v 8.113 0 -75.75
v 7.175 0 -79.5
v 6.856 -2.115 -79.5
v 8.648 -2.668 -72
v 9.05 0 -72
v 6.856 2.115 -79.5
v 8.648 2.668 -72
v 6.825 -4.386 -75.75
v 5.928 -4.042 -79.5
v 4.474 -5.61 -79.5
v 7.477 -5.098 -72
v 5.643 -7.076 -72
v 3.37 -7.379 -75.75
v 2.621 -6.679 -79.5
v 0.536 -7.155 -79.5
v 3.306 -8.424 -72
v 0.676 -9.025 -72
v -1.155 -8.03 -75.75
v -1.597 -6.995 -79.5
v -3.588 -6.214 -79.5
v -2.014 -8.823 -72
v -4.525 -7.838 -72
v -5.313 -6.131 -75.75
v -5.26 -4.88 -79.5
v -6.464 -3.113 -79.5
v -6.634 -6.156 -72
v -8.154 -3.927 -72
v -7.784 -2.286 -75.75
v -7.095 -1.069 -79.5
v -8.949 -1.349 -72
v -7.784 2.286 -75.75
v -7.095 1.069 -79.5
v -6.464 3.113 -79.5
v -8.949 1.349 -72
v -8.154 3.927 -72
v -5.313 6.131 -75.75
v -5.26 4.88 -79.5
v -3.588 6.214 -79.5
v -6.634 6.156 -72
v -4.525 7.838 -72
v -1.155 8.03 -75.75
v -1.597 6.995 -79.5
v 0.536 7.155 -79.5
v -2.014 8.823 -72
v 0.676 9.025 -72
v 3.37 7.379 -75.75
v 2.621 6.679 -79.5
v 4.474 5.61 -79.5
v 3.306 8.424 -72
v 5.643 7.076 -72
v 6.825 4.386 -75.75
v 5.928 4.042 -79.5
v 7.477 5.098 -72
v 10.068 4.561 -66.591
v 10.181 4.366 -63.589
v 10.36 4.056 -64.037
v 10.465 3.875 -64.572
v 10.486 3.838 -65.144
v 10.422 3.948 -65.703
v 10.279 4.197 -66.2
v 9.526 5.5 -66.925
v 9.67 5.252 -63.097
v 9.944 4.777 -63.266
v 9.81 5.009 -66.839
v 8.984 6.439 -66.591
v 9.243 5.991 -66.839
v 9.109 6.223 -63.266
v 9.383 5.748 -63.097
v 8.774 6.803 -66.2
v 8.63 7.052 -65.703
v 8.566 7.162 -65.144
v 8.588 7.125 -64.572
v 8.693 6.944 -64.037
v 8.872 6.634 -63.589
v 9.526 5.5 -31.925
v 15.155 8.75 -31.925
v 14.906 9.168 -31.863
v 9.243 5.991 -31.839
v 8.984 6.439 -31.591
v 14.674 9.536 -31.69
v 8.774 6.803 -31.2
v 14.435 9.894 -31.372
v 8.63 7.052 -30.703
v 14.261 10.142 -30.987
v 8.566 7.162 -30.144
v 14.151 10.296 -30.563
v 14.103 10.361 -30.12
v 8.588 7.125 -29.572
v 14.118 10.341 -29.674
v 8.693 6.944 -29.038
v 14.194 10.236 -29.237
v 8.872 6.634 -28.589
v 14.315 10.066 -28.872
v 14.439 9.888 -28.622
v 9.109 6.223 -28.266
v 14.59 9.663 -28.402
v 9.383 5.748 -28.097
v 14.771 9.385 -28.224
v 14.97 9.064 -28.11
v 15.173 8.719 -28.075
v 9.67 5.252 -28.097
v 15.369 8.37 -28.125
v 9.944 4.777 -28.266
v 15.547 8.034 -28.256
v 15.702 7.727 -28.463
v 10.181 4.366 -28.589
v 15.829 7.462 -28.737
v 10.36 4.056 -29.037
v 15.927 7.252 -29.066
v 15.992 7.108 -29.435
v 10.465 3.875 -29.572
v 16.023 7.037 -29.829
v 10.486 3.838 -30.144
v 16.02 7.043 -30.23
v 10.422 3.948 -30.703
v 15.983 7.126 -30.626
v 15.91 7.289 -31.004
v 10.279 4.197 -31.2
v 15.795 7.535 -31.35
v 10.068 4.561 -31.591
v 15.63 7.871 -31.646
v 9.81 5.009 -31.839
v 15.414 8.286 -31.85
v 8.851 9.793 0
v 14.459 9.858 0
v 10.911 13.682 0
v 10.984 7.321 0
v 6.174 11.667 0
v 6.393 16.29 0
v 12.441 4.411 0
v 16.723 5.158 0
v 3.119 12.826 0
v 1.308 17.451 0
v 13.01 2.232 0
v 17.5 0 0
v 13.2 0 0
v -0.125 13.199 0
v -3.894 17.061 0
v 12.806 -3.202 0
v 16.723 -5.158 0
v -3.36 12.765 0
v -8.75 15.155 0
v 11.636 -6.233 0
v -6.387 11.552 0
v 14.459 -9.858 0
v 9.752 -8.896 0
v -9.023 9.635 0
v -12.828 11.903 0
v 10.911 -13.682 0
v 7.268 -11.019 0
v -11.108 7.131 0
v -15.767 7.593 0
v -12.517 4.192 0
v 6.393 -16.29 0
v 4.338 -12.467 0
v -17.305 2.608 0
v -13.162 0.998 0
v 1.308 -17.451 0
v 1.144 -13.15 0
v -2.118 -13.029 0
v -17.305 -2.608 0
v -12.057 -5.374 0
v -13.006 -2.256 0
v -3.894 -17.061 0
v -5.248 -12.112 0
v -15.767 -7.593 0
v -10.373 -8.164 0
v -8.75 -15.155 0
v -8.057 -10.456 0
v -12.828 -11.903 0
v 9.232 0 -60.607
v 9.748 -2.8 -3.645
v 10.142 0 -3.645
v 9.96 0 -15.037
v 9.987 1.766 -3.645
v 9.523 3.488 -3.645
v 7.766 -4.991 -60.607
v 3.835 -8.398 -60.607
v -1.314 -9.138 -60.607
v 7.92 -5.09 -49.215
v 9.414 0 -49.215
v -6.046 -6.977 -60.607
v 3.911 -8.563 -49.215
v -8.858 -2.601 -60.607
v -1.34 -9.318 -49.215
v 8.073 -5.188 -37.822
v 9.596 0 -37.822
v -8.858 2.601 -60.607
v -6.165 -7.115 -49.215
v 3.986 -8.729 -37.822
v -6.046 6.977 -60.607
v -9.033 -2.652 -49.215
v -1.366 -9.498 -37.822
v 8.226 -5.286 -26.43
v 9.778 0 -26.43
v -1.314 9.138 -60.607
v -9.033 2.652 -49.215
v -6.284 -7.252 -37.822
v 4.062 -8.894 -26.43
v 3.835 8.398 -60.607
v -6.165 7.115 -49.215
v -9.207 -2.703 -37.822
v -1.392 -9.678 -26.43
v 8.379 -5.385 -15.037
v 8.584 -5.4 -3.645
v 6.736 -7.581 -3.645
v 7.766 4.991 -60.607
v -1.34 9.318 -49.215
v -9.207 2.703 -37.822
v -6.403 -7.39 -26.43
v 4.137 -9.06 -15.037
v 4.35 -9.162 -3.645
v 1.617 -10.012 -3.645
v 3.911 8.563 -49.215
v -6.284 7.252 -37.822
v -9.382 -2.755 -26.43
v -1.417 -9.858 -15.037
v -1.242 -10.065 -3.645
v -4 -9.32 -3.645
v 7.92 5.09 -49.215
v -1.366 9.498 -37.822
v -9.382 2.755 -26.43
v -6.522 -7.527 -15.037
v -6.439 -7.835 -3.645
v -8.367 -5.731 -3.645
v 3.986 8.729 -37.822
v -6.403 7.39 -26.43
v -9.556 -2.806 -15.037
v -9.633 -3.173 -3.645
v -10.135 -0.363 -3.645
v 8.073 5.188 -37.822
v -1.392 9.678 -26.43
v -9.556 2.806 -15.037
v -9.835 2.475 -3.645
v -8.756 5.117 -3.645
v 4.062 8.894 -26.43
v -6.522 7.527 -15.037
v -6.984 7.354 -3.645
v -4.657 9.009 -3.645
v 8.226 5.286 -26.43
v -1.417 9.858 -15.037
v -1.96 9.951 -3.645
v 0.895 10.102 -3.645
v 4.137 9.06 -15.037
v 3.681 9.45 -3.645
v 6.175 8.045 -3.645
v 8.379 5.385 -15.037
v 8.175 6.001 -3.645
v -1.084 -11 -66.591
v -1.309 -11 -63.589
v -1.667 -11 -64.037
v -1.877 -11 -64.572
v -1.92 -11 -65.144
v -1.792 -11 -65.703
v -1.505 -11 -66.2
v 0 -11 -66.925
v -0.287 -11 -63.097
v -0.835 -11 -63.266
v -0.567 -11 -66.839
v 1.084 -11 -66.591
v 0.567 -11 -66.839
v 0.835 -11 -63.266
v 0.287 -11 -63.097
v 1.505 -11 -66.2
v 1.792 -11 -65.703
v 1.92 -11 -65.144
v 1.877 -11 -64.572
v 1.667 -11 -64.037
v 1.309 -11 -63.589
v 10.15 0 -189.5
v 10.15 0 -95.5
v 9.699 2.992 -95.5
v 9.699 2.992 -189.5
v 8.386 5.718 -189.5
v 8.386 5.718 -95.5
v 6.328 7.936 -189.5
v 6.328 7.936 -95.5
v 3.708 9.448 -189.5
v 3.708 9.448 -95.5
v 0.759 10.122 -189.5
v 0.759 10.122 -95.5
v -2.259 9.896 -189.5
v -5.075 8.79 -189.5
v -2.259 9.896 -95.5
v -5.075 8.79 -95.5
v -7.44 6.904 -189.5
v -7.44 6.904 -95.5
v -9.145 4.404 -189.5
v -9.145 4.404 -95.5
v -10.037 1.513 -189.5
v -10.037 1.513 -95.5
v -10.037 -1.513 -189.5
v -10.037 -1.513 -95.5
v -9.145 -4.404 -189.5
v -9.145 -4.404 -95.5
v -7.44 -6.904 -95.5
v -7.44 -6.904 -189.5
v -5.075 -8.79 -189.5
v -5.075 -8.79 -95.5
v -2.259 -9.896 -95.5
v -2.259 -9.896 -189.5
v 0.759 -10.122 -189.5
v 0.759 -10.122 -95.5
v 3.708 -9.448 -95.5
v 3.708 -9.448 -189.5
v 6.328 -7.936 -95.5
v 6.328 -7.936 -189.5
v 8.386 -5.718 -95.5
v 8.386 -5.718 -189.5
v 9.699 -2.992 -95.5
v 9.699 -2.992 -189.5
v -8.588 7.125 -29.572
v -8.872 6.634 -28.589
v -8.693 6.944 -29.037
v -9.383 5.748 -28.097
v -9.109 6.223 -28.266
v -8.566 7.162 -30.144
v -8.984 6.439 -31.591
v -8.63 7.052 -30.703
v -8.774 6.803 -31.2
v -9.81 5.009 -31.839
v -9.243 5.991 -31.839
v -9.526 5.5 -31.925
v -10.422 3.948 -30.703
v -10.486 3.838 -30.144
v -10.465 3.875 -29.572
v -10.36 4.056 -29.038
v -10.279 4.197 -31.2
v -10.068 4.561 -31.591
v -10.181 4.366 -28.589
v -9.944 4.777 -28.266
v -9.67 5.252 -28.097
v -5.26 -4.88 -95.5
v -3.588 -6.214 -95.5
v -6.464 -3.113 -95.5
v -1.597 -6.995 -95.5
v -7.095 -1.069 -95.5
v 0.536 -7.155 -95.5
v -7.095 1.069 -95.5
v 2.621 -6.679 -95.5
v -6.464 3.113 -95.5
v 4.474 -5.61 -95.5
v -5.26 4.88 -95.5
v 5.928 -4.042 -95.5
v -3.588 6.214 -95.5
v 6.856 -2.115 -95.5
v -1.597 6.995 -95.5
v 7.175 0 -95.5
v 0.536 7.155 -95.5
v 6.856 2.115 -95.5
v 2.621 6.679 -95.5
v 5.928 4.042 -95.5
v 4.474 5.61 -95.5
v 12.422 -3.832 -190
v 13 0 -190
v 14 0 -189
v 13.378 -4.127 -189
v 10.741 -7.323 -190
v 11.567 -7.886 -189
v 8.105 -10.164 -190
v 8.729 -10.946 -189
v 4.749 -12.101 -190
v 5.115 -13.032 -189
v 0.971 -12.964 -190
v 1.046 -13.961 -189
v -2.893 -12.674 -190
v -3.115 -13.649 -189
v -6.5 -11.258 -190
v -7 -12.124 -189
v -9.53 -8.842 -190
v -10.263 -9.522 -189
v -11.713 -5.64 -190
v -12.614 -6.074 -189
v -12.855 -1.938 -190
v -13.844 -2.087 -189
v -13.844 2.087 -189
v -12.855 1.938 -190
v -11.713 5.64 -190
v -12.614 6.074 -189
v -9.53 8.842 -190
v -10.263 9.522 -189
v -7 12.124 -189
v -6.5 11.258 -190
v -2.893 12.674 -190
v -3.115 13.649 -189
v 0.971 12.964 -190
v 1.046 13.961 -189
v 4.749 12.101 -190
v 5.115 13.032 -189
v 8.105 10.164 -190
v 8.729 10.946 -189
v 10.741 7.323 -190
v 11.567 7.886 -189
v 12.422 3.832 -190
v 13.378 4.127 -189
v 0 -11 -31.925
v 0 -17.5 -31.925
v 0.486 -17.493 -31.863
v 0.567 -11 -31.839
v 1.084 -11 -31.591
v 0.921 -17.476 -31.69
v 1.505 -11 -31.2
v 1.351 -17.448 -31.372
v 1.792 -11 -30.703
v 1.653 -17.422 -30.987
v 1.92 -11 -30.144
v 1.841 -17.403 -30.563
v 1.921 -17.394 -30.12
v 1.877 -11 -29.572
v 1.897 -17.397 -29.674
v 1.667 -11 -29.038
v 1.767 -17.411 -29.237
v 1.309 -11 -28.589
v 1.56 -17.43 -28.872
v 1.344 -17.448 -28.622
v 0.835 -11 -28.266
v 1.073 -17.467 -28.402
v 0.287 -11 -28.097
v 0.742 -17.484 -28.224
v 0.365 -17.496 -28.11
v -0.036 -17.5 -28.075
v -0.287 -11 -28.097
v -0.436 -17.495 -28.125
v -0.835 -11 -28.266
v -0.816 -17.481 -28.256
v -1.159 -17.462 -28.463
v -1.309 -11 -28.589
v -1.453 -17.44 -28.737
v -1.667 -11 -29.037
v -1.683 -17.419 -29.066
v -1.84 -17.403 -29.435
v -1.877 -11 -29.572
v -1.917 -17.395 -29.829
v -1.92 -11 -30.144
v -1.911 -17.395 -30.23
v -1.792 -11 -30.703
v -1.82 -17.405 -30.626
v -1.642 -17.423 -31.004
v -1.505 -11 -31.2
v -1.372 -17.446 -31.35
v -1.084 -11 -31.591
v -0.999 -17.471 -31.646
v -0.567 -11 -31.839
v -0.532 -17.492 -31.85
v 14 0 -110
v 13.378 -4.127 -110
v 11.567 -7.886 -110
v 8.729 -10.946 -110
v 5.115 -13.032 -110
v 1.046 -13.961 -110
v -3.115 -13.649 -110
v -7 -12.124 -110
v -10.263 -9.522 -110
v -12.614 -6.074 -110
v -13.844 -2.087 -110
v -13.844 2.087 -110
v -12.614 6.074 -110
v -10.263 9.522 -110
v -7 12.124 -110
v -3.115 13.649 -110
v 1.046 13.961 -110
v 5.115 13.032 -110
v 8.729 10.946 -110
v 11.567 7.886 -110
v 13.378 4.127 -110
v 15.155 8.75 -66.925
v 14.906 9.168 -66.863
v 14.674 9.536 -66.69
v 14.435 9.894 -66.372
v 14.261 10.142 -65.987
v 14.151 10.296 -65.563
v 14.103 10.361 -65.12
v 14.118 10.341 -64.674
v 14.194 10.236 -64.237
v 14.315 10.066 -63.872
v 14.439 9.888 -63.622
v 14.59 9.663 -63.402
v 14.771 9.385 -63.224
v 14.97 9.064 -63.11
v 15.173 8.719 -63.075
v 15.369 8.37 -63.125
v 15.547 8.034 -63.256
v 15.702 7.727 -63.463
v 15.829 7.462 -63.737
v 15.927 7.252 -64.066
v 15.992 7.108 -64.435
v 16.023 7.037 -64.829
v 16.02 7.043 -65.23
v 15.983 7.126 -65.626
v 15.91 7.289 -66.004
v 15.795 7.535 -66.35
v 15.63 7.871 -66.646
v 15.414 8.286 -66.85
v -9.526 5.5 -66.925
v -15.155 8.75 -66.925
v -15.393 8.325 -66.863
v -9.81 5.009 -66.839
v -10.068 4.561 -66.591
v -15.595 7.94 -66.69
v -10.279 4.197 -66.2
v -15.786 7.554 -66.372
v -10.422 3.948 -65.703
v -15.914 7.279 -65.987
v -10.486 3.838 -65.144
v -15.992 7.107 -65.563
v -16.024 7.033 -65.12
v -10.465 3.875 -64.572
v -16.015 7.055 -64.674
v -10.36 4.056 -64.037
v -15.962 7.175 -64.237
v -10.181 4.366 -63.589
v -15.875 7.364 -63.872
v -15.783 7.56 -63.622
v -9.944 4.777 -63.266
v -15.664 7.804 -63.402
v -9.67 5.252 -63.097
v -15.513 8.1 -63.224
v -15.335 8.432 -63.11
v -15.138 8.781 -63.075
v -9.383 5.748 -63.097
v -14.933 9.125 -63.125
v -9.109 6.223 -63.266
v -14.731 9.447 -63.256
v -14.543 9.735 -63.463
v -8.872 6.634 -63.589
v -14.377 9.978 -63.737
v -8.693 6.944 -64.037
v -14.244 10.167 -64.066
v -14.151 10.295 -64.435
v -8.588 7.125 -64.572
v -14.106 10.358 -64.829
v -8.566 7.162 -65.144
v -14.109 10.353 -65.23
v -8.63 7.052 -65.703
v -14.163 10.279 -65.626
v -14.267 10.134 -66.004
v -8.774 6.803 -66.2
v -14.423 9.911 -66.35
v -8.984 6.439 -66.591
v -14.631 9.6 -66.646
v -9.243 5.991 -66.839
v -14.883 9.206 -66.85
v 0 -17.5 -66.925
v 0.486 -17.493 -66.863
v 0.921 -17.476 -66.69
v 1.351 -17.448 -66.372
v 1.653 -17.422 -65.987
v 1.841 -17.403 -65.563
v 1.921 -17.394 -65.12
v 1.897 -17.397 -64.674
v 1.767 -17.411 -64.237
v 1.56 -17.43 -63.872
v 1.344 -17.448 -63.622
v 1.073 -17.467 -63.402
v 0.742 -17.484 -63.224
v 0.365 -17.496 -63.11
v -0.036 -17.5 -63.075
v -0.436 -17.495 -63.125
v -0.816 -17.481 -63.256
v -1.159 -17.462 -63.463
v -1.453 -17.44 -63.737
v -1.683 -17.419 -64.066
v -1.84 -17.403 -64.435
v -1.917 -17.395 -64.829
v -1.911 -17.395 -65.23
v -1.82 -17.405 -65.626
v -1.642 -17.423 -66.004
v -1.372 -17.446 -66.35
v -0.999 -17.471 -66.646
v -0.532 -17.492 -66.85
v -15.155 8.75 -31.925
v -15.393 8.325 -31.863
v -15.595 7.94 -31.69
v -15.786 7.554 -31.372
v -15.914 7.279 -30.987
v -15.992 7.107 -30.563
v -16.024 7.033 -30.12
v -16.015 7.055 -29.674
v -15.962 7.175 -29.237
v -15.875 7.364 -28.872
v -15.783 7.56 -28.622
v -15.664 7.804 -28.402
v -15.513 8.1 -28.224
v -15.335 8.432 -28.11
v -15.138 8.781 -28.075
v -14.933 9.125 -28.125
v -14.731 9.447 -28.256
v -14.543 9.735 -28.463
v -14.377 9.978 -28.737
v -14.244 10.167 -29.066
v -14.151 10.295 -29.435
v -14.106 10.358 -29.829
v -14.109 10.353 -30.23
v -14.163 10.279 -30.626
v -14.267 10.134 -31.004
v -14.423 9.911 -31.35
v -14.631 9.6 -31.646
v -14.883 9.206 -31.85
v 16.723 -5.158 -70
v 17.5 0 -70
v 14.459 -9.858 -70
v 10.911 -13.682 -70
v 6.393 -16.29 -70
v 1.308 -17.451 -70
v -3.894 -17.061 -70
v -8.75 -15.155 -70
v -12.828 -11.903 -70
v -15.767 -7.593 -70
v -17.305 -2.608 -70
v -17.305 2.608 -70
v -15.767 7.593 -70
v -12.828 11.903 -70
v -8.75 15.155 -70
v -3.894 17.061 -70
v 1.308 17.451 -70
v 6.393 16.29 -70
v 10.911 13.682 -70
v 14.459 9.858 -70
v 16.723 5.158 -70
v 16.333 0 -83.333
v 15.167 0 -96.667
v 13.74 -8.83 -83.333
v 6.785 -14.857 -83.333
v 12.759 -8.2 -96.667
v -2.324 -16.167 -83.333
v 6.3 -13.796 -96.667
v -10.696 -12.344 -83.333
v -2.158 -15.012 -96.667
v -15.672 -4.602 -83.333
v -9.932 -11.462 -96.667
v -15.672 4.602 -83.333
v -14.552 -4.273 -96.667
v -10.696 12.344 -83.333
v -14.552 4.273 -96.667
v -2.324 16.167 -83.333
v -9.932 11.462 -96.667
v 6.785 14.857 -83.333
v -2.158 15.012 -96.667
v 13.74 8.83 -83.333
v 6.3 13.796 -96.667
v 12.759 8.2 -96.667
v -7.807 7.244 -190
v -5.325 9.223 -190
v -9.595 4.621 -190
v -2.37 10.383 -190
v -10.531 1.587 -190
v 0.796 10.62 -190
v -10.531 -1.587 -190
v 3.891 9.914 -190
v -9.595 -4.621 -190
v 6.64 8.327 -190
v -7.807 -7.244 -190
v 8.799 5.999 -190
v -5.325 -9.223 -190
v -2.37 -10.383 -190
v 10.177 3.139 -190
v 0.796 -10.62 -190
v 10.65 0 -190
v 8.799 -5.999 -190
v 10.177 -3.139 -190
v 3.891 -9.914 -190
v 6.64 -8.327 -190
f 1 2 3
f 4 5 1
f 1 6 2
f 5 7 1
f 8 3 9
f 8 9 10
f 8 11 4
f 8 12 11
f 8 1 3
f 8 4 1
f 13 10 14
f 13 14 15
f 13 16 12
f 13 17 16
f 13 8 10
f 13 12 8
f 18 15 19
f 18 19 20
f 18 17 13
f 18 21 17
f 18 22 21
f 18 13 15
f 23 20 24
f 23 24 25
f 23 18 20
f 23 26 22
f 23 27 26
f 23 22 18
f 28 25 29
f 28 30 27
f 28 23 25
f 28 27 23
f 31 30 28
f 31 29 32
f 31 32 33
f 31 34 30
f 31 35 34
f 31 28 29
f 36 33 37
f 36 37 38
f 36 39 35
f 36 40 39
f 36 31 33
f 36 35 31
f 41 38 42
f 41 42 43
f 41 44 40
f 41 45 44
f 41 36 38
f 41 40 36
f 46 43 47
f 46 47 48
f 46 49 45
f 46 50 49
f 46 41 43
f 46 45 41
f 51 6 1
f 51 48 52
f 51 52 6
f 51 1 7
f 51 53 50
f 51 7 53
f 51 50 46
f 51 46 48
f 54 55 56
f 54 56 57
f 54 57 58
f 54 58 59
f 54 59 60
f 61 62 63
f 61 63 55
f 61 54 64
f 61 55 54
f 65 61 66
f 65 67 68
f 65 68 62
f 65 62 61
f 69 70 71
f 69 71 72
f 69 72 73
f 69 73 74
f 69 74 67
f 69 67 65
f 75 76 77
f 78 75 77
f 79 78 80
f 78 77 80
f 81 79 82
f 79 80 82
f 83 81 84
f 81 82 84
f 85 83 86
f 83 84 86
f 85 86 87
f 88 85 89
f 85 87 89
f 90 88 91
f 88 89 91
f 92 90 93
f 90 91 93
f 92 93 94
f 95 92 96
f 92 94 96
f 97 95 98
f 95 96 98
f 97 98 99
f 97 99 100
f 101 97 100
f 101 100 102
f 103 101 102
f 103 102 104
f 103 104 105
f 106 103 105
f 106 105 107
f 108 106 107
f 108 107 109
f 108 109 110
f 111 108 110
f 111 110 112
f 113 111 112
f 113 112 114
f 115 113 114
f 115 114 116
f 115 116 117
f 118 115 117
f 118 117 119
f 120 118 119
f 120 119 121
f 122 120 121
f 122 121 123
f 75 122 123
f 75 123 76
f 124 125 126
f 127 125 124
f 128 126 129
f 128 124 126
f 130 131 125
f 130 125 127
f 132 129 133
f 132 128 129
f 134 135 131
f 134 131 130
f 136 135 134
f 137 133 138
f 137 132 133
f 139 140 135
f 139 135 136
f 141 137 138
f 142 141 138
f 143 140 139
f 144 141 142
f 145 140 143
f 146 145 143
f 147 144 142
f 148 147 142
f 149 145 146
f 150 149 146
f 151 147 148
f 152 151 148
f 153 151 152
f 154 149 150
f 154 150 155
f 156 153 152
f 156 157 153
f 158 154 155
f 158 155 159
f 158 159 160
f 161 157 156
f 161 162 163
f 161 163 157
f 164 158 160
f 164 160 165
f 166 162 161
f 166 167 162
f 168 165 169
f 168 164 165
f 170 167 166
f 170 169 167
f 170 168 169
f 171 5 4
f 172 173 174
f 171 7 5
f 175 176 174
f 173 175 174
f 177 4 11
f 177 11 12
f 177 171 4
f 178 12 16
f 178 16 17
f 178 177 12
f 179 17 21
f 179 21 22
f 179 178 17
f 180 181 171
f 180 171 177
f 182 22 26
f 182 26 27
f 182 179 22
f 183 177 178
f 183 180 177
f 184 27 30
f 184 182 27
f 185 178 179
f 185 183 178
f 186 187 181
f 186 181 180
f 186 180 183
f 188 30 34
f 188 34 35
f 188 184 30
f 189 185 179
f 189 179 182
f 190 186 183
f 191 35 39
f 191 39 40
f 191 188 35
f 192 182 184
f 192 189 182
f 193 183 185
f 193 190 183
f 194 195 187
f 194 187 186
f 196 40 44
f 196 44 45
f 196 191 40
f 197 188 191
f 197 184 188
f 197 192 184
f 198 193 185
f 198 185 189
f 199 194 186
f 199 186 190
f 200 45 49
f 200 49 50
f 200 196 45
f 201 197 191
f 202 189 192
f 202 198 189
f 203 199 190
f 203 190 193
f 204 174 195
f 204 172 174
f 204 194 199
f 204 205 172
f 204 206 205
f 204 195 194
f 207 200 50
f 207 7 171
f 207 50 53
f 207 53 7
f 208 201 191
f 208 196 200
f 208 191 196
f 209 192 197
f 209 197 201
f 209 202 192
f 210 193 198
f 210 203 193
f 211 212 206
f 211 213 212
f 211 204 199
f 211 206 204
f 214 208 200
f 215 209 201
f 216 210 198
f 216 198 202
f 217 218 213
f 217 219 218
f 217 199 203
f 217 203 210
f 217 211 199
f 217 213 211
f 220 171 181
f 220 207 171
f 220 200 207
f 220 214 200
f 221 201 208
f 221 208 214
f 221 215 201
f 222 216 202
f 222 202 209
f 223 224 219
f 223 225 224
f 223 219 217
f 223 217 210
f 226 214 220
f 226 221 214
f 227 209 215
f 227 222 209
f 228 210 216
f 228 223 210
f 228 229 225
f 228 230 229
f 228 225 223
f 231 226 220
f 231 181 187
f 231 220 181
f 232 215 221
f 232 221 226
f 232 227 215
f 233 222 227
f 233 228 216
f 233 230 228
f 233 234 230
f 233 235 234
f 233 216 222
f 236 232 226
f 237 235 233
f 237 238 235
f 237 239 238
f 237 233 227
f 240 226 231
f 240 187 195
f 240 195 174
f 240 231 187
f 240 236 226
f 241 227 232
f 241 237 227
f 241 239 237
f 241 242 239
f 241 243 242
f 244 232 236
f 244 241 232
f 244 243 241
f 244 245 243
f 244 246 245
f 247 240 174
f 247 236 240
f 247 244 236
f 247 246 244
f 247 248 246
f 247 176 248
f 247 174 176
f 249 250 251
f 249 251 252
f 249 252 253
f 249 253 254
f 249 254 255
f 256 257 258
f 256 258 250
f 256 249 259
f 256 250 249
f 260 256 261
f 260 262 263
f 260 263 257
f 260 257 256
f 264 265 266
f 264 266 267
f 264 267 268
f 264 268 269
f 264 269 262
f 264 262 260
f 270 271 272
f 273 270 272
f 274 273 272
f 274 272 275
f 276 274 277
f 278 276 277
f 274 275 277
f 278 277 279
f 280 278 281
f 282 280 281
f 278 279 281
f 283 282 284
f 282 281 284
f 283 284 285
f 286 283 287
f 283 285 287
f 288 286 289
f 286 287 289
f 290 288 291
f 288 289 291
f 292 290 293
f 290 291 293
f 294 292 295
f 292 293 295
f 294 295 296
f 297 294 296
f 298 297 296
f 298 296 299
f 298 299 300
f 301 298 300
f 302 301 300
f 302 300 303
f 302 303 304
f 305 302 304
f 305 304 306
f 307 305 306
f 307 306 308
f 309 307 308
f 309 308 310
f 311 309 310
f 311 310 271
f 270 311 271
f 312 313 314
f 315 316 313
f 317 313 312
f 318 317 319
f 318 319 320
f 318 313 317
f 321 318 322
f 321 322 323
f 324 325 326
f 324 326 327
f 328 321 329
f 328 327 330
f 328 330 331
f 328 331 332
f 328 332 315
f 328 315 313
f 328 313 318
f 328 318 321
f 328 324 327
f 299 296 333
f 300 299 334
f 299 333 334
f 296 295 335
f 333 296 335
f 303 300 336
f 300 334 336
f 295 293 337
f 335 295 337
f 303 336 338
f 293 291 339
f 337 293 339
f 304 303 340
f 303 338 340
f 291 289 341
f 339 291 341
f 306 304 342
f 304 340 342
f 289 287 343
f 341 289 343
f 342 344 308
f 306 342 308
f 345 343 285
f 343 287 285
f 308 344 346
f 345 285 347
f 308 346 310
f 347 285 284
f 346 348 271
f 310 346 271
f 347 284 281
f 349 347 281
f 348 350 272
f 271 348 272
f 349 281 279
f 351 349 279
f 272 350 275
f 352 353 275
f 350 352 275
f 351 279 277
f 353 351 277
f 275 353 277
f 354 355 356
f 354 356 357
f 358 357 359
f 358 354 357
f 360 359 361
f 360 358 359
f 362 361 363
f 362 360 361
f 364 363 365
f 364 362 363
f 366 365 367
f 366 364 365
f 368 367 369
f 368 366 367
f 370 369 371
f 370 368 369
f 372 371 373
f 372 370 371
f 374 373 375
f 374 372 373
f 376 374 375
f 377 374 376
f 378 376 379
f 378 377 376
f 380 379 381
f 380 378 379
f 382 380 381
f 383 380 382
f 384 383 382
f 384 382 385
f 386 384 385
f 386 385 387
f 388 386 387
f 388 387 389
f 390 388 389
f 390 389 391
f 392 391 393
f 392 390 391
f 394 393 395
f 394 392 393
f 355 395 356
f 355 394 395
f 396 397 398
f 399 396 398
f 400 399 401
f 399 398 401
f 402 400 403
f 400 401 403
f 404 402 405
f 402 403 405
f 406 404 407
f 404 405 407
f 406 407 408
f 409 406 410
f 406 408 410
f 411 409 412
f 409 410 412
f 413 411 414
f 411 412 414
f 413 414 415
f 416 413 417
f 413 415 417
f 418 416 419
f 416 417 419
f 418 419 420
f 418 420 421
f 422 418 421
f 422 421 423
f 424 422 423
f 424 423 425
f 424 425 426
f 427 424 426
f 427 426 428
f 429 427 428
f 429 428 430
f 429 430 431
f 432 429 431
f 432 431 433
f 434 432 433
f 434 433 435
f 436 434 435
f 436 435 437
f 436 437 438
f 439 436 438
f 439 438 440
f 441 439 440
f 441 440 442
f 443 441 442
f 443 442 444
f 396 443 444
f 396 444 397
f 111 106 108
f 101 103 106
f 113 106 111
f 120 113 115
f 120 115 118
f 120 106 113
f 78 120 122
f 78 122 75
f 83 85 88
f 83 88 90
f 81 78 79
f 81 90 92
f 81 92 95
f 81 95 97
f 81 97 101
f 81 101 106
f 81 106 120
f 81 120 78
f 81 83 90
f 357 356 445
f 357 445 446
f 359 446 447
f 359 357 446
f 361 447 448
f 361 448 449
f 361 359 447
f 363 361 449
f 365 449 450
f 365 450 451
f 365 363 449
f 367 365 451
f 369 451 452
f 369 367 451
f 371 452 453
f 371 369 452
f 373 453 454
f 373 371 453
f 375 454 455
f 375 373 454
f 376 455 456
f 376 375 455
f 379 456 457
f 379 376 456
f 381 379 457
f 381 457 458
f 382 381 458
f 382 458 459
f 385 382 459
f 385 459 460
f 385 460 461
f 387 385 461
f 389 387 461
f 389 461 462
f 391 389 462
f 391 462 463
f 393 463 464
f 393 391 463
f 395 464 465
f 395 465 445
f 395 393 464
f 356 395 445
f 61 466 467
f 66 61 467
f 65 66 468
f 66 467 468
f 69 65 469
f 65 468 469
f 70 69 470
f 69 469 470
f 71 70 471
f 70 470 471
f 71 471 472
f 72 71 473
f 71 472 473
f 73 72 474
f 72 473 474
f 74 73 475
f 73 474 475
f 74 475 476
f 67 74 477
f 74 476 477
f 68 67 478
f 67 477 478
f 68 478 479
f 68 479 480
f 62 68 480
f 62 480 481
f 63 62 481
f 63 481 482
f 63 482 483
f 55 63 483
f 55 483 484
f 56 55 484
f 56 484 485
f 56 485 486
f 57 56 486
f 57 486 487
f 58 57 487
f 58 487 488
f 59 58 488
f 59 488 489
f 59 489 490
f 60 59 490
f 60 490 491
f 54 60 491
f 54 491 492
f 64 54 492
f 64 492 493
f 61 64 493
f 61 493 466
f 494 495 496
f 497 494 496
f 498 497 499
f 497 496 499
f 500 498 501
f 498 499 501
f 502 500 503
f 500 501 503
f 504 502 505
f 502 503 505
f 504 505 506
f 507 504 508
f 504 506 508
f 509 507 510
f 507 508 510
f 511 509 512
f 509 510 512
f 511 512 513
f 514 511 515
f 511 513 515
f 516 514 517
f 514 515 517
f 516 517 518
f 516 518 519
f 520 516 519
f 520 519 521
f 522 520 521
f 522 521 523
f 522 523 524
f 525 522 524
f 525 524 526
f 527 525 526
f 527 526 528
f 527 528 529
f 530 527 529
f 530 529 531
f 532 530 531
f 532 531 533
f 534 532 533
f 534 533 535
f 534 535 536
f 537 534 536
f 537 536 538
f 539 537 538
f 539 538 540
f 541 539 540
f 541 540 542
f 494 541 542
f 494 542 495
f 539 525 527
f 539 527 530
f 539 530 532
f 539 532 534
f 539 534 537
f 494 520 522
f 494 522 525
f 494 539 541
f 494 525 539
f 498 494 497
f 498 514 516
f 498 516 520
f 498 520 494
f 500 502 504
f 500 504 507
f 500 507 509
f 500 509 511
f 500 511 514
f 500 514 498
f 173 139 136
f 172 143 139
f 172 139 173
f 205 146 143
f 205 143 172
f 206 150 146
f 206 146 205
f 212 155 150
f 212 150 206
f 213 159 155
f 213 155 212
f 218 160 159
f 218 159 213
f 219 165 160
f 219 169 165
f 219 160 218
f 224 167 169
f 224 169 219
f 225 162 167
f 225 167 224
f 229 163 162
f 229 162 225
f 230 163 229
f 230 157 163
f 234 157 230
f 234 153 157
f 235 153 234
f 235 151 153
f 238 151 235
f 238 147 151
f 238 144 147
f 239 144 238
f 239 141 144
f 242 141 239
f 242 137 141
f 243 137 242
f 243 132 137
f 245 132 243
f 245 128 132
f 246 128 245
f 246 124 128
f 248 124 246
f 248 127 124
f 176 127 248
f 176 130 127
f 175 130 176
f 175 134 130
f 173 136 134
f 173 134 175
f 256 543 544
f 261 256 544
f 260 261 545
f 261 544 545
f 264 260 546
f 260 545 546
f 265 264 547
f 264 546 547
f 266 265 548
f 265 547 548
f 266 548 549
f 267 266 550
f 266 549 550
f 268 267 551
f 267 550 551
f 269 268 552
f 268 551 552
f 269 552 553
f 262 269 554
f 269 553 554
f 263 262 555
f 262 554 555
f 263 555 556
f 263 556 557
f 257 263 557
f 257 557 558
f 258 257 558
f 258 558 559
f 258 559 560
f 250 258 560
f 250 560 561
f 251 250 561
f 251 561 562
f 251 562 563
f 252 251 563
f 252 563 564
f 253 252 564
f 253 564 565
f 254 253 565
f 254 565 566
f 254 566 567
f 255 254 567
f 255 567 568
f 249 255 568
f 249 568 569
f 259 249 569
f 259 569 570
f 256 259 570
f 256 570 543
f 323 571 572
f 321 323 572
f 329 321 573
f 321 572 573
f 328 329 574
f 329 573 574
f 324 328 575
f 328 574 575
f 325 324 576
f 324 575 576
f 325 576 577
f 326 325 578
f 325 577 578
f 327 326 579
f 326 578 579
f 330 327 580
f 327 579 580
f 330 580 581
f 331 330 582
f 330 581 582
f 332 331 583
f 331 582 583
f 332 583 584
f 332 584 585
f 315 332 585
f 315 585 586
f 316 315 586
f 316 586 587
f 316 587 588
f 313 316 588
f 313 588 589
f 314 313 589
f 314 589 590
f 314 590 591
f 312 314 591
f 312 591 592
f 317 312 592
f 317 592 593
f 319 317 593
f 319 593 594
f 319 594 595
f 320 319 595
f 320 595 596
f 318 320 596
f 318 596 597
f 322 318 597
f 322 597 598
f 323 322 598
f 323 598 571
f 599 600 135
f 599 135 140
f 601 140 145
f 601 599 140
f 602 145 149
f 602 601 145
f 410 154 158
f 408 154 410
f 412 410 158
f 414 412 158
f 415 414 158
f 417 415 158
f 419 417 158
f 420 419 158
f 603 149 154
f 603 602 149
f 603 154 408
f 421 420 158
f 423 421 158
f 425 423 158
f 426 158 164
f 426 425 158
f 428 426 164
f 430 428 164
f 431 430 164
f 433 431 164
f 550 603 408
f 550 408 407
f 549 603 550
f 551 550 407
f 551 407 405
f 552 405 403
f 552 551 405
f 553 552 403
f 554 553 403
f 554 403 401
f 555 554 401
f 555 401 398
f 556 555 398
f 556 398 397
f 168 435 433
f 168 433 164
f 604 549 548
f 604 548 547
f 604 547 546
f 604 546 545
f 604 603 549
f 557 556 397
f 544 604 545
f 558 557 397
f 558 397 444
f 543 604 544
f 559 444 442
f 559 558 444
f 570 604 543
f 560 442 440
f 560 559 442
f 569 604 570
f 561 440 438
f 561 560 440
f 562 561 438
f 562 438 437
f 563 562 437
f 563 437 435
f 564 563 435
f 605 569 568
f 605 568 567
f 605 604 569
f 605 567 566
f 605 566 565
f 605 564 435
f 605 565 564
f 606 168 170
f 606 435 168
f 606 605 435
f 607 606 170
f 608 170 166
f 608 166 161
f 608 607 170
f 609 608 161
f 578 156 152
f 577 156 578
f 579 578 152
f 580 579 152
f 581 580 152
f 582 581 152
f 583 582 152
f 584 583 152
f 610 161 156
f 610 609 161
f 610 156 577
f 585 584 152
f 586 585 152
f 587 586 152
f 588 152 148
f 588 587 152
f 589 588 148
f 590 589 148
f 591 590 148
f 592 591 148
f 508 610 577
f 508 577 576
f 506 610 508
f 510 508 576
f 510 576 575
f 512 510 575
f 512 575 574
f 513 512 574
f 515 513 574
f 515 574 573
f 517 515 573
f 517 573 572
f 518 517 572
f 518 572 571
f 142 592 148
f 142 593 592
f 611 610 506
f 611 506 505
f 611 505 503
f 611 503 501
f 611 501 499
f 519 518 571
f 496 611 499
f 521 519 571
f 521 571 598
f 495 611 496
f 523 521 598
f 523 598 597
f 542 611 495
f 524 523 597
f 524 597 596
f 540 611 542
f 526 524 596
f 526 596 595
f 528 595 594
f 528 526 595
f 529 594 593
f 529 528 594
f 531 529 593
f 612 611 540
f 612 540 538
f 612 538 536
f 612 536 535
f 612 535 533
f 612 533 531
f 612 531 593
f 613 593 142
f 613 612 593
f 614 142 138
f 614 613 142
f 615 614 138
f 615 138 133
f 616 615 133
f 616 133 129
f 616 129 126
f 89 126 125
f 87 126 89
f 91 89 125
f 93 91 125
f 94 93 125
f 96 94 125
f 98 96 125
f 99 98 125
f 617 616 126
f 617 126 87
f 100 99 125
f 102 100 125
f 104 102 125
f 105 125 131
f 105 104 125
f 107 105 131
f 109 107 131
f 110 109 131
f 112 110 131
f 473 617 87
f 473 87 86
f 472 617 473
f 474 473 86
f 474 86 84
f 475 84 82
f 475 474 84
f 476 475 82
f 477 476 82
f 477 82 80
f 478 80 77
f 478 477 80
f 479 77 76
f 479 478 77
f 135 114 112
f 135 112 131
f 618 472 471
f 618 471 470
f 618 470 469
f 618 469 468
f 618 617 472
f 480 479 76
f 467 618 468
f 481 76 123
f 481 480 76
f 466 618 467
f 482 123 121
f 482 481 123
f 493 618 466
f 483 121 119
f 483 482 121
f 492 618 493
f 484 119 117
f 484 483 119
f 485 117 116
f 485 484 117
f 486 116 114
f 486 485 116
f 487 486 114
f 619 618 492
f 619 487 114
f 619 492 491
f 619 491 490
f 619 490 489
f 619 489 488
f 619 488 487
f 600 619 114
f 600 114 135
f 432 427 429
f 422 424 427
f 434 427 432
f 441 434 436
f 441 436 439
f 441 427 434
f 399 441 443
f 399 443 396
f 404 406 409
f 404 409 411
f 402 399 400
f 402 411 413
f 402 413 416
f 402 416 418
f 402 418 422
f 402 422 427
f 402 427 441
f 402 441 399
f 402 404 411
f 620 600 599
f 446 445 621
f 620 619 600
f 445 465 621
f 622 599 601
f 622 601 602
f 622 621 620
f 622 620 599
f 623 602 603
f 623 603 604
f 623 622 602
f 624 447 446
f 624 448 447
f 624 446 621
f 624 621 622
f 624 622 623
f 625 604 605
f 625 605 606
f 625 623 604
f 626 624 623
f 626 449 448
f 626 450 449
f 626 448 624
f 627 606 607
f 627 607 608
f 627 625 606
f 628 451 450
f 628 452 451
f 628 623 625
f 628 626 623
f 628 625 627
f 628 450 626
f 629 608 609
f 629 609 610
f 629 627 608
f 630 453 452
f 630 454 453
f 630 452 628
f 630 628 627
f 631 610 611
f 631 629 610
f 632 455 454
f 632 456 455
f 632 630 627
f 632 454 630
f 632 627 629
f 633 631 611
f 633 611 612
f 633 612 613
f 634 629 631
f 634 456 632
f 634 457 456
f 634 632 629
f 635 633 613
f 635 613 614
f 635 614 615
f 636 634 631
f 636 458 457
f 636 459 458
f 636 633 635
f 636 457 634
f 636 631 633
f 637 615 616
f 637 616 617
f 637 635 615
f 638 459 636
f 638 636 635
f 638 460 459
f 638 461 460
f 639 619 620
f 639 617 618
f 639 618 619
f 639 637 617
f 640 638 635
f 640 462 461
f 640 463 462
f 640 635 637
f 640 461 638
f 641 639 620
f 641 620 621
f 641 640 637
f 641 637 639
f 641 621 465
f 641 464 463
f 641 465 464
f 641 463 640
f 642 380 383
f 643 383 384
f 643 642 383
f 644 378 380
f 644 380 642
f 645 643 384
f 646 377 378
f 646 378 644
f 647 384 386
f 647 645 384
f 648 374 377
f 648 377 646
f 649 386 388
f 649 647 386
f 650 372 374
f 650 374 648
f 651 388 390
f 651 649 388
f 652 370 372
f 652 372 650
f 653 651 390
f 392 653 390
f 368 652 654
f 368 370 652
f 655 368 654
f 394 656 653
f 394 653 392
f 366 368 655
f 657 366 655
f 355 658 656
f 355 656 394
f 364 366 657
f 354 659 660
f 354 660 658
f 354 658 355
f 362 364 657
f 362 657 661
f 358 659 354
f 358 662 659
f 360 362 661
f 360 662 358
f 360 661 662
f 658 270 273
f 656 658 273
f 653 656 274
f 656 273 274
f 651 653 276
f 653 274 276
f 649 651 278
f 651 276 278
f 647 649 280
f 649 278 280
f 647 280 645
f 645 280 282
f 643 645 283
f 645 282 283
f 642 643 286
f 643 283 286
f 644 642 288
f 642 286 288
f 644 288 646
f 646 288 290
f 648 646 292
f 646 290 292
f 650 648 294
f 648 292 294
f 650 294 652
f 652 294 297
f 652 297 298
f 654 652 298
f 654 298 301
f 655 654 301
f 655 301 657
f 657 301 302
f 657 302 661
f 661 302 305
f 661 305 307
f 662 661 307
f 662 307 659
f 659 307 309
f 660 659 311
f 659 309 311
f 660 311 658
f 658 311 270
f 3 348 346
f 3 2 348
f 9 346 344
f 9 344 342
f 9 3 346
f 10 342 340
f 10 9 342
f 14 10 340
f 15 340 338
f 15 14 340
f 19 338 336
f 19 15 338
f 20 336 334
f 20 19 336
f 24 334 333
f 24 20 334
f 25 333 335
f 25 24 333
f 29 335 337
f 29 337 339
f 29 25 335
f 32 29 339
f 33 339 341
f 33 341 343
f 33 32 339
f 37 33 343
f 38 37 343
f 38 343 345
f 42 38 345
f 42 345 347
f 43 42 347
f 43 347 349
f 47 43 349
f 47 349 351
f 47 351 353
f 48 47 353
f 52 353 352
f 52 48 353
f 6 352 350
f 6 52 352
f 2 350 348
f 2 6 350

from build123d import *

# Parameters (mm, degrees)
SKETCH_5_R               = 1.925
CUT_EXTRUDE_3_DEPTH      = 6.5
PATTERN_CIRCULAR_1_COUNT = 3
CUT_EXTRUDE_4_REACH      = 100.655
SKETCH_6_R               = 10.15
CHAMFER_1_SIZE           = 1
CHAMFER_2_SIZE           = 0.5
CHAMFER_3_SIZE           = 3
CHAMFER_3_SIZE2          = 3.645101124


with BuildPart() as part:
    # 스케치2 → 회전1 (revolve)
    with BuildSketch(Plane(origin=(0, 0, 0), x_dir=(0, 0, -1), z_dir=(1, 0, 0)), mode=Mode.PRIVATE) as revolve_1_sk:
        Polygon((0.919706719, -10.18531024), (0, -10.2), (0, -17.5), (70, -17.5), (110, -14), (190, -14), (190, 0), (95.5, 0), (95.5, -7.175), (79.5, -7.175), (72, -9.05), align=None)
    revolve(revolve_1_sk.sketch.rotate(Axis((0, 0, 0), (0, 0, -1)), 270), axis=Axis((0, 0, 0), (0, 0, -1)))

    # 스케치5 → 컷-돌출3 (cut)
    with BuildSketch(Plane(origin=(0, -17.5, 0), x_dir=(-1, 0, 0), z_dir=(0, -1, 0))):
        with Locations(Location((0, 30, 0), (0, 0, 90))):
            Circle(SKETCH_5_R)
        with Locations(Location((0, 65, 0), (0, 0, 90))):
            Circle(SKETCH_5_R)
    cut_extrude_3 = extrude(amount=-CUT_EXTRUDE_3_DEPTH, mode=Mode.SUBTRACT)

    # 원형 패턴1: 컷-돌출3 ×3 about axis
    pattern_circular_1_axis = Axis((0, 0, 0), (0, 0, 1))
    for i in range(1, PATTERN_CIRCULAR_1_COUNT):
        add(cut_extrude_3.rotate(pattern_circular_1_axis, i * 360 / PATTERN_CIRCULAR_1_COUNT), mode=Mode.SUBTRACT)

    # 스케치6 → 컷-돌출4 (cut, up to next)
    with BuildSketch(Plane.XY.offset(-95.5), mode=Mode.PRIVATE) as cut_extrude_4_sk1:
        Circle(SKETCH_6_R)
    cut_extrude_4_tool1 = extrude(cut_extrude_4_sk1.sketch, amount=-CUT_EXTRUDE_4_REACH, mode=Mode.PRIVATE) & part.part
    add(cut_extrude_4_tool1.solids().sort_by_distance((0, 0, -95.5))[0], mode=Mode.SUBTRACT)

    # 모따기1
    chamfer_1_edges = [part.edges().sort_by_distance(p)[0] for p in [
        (-14, 0, -190),
    ]]
    chamfer(chamfer_1_edges, length=CHAMFER_1_SIZE)

    # 모따기2
    chamfer_2_edges = [part.edges().sort_by_distance(p)[0] for p in [
        (-10.15, 0, -190),
    ]]
    chamfer(chamfer_2_edges, length=CHAMFER_2_SIZE)

    # 모따기3
    chamfer_3_edges = [part.edges().sort_by_distance(p)[0] for p in [
        (-10.2, 0, 0),
    ]]
    chamfer_3_side = [part.faces().sort_by_distance(p)[0] for p in [
        (-10.694974747, 0, 0),
    ]]
    chamfer(chamfer_3_edges, length=CHAMFER_3_SIZE, length2=CHAMFER_3_SIZE2, reference=chamfer_3_side[0])


solid = part.part
